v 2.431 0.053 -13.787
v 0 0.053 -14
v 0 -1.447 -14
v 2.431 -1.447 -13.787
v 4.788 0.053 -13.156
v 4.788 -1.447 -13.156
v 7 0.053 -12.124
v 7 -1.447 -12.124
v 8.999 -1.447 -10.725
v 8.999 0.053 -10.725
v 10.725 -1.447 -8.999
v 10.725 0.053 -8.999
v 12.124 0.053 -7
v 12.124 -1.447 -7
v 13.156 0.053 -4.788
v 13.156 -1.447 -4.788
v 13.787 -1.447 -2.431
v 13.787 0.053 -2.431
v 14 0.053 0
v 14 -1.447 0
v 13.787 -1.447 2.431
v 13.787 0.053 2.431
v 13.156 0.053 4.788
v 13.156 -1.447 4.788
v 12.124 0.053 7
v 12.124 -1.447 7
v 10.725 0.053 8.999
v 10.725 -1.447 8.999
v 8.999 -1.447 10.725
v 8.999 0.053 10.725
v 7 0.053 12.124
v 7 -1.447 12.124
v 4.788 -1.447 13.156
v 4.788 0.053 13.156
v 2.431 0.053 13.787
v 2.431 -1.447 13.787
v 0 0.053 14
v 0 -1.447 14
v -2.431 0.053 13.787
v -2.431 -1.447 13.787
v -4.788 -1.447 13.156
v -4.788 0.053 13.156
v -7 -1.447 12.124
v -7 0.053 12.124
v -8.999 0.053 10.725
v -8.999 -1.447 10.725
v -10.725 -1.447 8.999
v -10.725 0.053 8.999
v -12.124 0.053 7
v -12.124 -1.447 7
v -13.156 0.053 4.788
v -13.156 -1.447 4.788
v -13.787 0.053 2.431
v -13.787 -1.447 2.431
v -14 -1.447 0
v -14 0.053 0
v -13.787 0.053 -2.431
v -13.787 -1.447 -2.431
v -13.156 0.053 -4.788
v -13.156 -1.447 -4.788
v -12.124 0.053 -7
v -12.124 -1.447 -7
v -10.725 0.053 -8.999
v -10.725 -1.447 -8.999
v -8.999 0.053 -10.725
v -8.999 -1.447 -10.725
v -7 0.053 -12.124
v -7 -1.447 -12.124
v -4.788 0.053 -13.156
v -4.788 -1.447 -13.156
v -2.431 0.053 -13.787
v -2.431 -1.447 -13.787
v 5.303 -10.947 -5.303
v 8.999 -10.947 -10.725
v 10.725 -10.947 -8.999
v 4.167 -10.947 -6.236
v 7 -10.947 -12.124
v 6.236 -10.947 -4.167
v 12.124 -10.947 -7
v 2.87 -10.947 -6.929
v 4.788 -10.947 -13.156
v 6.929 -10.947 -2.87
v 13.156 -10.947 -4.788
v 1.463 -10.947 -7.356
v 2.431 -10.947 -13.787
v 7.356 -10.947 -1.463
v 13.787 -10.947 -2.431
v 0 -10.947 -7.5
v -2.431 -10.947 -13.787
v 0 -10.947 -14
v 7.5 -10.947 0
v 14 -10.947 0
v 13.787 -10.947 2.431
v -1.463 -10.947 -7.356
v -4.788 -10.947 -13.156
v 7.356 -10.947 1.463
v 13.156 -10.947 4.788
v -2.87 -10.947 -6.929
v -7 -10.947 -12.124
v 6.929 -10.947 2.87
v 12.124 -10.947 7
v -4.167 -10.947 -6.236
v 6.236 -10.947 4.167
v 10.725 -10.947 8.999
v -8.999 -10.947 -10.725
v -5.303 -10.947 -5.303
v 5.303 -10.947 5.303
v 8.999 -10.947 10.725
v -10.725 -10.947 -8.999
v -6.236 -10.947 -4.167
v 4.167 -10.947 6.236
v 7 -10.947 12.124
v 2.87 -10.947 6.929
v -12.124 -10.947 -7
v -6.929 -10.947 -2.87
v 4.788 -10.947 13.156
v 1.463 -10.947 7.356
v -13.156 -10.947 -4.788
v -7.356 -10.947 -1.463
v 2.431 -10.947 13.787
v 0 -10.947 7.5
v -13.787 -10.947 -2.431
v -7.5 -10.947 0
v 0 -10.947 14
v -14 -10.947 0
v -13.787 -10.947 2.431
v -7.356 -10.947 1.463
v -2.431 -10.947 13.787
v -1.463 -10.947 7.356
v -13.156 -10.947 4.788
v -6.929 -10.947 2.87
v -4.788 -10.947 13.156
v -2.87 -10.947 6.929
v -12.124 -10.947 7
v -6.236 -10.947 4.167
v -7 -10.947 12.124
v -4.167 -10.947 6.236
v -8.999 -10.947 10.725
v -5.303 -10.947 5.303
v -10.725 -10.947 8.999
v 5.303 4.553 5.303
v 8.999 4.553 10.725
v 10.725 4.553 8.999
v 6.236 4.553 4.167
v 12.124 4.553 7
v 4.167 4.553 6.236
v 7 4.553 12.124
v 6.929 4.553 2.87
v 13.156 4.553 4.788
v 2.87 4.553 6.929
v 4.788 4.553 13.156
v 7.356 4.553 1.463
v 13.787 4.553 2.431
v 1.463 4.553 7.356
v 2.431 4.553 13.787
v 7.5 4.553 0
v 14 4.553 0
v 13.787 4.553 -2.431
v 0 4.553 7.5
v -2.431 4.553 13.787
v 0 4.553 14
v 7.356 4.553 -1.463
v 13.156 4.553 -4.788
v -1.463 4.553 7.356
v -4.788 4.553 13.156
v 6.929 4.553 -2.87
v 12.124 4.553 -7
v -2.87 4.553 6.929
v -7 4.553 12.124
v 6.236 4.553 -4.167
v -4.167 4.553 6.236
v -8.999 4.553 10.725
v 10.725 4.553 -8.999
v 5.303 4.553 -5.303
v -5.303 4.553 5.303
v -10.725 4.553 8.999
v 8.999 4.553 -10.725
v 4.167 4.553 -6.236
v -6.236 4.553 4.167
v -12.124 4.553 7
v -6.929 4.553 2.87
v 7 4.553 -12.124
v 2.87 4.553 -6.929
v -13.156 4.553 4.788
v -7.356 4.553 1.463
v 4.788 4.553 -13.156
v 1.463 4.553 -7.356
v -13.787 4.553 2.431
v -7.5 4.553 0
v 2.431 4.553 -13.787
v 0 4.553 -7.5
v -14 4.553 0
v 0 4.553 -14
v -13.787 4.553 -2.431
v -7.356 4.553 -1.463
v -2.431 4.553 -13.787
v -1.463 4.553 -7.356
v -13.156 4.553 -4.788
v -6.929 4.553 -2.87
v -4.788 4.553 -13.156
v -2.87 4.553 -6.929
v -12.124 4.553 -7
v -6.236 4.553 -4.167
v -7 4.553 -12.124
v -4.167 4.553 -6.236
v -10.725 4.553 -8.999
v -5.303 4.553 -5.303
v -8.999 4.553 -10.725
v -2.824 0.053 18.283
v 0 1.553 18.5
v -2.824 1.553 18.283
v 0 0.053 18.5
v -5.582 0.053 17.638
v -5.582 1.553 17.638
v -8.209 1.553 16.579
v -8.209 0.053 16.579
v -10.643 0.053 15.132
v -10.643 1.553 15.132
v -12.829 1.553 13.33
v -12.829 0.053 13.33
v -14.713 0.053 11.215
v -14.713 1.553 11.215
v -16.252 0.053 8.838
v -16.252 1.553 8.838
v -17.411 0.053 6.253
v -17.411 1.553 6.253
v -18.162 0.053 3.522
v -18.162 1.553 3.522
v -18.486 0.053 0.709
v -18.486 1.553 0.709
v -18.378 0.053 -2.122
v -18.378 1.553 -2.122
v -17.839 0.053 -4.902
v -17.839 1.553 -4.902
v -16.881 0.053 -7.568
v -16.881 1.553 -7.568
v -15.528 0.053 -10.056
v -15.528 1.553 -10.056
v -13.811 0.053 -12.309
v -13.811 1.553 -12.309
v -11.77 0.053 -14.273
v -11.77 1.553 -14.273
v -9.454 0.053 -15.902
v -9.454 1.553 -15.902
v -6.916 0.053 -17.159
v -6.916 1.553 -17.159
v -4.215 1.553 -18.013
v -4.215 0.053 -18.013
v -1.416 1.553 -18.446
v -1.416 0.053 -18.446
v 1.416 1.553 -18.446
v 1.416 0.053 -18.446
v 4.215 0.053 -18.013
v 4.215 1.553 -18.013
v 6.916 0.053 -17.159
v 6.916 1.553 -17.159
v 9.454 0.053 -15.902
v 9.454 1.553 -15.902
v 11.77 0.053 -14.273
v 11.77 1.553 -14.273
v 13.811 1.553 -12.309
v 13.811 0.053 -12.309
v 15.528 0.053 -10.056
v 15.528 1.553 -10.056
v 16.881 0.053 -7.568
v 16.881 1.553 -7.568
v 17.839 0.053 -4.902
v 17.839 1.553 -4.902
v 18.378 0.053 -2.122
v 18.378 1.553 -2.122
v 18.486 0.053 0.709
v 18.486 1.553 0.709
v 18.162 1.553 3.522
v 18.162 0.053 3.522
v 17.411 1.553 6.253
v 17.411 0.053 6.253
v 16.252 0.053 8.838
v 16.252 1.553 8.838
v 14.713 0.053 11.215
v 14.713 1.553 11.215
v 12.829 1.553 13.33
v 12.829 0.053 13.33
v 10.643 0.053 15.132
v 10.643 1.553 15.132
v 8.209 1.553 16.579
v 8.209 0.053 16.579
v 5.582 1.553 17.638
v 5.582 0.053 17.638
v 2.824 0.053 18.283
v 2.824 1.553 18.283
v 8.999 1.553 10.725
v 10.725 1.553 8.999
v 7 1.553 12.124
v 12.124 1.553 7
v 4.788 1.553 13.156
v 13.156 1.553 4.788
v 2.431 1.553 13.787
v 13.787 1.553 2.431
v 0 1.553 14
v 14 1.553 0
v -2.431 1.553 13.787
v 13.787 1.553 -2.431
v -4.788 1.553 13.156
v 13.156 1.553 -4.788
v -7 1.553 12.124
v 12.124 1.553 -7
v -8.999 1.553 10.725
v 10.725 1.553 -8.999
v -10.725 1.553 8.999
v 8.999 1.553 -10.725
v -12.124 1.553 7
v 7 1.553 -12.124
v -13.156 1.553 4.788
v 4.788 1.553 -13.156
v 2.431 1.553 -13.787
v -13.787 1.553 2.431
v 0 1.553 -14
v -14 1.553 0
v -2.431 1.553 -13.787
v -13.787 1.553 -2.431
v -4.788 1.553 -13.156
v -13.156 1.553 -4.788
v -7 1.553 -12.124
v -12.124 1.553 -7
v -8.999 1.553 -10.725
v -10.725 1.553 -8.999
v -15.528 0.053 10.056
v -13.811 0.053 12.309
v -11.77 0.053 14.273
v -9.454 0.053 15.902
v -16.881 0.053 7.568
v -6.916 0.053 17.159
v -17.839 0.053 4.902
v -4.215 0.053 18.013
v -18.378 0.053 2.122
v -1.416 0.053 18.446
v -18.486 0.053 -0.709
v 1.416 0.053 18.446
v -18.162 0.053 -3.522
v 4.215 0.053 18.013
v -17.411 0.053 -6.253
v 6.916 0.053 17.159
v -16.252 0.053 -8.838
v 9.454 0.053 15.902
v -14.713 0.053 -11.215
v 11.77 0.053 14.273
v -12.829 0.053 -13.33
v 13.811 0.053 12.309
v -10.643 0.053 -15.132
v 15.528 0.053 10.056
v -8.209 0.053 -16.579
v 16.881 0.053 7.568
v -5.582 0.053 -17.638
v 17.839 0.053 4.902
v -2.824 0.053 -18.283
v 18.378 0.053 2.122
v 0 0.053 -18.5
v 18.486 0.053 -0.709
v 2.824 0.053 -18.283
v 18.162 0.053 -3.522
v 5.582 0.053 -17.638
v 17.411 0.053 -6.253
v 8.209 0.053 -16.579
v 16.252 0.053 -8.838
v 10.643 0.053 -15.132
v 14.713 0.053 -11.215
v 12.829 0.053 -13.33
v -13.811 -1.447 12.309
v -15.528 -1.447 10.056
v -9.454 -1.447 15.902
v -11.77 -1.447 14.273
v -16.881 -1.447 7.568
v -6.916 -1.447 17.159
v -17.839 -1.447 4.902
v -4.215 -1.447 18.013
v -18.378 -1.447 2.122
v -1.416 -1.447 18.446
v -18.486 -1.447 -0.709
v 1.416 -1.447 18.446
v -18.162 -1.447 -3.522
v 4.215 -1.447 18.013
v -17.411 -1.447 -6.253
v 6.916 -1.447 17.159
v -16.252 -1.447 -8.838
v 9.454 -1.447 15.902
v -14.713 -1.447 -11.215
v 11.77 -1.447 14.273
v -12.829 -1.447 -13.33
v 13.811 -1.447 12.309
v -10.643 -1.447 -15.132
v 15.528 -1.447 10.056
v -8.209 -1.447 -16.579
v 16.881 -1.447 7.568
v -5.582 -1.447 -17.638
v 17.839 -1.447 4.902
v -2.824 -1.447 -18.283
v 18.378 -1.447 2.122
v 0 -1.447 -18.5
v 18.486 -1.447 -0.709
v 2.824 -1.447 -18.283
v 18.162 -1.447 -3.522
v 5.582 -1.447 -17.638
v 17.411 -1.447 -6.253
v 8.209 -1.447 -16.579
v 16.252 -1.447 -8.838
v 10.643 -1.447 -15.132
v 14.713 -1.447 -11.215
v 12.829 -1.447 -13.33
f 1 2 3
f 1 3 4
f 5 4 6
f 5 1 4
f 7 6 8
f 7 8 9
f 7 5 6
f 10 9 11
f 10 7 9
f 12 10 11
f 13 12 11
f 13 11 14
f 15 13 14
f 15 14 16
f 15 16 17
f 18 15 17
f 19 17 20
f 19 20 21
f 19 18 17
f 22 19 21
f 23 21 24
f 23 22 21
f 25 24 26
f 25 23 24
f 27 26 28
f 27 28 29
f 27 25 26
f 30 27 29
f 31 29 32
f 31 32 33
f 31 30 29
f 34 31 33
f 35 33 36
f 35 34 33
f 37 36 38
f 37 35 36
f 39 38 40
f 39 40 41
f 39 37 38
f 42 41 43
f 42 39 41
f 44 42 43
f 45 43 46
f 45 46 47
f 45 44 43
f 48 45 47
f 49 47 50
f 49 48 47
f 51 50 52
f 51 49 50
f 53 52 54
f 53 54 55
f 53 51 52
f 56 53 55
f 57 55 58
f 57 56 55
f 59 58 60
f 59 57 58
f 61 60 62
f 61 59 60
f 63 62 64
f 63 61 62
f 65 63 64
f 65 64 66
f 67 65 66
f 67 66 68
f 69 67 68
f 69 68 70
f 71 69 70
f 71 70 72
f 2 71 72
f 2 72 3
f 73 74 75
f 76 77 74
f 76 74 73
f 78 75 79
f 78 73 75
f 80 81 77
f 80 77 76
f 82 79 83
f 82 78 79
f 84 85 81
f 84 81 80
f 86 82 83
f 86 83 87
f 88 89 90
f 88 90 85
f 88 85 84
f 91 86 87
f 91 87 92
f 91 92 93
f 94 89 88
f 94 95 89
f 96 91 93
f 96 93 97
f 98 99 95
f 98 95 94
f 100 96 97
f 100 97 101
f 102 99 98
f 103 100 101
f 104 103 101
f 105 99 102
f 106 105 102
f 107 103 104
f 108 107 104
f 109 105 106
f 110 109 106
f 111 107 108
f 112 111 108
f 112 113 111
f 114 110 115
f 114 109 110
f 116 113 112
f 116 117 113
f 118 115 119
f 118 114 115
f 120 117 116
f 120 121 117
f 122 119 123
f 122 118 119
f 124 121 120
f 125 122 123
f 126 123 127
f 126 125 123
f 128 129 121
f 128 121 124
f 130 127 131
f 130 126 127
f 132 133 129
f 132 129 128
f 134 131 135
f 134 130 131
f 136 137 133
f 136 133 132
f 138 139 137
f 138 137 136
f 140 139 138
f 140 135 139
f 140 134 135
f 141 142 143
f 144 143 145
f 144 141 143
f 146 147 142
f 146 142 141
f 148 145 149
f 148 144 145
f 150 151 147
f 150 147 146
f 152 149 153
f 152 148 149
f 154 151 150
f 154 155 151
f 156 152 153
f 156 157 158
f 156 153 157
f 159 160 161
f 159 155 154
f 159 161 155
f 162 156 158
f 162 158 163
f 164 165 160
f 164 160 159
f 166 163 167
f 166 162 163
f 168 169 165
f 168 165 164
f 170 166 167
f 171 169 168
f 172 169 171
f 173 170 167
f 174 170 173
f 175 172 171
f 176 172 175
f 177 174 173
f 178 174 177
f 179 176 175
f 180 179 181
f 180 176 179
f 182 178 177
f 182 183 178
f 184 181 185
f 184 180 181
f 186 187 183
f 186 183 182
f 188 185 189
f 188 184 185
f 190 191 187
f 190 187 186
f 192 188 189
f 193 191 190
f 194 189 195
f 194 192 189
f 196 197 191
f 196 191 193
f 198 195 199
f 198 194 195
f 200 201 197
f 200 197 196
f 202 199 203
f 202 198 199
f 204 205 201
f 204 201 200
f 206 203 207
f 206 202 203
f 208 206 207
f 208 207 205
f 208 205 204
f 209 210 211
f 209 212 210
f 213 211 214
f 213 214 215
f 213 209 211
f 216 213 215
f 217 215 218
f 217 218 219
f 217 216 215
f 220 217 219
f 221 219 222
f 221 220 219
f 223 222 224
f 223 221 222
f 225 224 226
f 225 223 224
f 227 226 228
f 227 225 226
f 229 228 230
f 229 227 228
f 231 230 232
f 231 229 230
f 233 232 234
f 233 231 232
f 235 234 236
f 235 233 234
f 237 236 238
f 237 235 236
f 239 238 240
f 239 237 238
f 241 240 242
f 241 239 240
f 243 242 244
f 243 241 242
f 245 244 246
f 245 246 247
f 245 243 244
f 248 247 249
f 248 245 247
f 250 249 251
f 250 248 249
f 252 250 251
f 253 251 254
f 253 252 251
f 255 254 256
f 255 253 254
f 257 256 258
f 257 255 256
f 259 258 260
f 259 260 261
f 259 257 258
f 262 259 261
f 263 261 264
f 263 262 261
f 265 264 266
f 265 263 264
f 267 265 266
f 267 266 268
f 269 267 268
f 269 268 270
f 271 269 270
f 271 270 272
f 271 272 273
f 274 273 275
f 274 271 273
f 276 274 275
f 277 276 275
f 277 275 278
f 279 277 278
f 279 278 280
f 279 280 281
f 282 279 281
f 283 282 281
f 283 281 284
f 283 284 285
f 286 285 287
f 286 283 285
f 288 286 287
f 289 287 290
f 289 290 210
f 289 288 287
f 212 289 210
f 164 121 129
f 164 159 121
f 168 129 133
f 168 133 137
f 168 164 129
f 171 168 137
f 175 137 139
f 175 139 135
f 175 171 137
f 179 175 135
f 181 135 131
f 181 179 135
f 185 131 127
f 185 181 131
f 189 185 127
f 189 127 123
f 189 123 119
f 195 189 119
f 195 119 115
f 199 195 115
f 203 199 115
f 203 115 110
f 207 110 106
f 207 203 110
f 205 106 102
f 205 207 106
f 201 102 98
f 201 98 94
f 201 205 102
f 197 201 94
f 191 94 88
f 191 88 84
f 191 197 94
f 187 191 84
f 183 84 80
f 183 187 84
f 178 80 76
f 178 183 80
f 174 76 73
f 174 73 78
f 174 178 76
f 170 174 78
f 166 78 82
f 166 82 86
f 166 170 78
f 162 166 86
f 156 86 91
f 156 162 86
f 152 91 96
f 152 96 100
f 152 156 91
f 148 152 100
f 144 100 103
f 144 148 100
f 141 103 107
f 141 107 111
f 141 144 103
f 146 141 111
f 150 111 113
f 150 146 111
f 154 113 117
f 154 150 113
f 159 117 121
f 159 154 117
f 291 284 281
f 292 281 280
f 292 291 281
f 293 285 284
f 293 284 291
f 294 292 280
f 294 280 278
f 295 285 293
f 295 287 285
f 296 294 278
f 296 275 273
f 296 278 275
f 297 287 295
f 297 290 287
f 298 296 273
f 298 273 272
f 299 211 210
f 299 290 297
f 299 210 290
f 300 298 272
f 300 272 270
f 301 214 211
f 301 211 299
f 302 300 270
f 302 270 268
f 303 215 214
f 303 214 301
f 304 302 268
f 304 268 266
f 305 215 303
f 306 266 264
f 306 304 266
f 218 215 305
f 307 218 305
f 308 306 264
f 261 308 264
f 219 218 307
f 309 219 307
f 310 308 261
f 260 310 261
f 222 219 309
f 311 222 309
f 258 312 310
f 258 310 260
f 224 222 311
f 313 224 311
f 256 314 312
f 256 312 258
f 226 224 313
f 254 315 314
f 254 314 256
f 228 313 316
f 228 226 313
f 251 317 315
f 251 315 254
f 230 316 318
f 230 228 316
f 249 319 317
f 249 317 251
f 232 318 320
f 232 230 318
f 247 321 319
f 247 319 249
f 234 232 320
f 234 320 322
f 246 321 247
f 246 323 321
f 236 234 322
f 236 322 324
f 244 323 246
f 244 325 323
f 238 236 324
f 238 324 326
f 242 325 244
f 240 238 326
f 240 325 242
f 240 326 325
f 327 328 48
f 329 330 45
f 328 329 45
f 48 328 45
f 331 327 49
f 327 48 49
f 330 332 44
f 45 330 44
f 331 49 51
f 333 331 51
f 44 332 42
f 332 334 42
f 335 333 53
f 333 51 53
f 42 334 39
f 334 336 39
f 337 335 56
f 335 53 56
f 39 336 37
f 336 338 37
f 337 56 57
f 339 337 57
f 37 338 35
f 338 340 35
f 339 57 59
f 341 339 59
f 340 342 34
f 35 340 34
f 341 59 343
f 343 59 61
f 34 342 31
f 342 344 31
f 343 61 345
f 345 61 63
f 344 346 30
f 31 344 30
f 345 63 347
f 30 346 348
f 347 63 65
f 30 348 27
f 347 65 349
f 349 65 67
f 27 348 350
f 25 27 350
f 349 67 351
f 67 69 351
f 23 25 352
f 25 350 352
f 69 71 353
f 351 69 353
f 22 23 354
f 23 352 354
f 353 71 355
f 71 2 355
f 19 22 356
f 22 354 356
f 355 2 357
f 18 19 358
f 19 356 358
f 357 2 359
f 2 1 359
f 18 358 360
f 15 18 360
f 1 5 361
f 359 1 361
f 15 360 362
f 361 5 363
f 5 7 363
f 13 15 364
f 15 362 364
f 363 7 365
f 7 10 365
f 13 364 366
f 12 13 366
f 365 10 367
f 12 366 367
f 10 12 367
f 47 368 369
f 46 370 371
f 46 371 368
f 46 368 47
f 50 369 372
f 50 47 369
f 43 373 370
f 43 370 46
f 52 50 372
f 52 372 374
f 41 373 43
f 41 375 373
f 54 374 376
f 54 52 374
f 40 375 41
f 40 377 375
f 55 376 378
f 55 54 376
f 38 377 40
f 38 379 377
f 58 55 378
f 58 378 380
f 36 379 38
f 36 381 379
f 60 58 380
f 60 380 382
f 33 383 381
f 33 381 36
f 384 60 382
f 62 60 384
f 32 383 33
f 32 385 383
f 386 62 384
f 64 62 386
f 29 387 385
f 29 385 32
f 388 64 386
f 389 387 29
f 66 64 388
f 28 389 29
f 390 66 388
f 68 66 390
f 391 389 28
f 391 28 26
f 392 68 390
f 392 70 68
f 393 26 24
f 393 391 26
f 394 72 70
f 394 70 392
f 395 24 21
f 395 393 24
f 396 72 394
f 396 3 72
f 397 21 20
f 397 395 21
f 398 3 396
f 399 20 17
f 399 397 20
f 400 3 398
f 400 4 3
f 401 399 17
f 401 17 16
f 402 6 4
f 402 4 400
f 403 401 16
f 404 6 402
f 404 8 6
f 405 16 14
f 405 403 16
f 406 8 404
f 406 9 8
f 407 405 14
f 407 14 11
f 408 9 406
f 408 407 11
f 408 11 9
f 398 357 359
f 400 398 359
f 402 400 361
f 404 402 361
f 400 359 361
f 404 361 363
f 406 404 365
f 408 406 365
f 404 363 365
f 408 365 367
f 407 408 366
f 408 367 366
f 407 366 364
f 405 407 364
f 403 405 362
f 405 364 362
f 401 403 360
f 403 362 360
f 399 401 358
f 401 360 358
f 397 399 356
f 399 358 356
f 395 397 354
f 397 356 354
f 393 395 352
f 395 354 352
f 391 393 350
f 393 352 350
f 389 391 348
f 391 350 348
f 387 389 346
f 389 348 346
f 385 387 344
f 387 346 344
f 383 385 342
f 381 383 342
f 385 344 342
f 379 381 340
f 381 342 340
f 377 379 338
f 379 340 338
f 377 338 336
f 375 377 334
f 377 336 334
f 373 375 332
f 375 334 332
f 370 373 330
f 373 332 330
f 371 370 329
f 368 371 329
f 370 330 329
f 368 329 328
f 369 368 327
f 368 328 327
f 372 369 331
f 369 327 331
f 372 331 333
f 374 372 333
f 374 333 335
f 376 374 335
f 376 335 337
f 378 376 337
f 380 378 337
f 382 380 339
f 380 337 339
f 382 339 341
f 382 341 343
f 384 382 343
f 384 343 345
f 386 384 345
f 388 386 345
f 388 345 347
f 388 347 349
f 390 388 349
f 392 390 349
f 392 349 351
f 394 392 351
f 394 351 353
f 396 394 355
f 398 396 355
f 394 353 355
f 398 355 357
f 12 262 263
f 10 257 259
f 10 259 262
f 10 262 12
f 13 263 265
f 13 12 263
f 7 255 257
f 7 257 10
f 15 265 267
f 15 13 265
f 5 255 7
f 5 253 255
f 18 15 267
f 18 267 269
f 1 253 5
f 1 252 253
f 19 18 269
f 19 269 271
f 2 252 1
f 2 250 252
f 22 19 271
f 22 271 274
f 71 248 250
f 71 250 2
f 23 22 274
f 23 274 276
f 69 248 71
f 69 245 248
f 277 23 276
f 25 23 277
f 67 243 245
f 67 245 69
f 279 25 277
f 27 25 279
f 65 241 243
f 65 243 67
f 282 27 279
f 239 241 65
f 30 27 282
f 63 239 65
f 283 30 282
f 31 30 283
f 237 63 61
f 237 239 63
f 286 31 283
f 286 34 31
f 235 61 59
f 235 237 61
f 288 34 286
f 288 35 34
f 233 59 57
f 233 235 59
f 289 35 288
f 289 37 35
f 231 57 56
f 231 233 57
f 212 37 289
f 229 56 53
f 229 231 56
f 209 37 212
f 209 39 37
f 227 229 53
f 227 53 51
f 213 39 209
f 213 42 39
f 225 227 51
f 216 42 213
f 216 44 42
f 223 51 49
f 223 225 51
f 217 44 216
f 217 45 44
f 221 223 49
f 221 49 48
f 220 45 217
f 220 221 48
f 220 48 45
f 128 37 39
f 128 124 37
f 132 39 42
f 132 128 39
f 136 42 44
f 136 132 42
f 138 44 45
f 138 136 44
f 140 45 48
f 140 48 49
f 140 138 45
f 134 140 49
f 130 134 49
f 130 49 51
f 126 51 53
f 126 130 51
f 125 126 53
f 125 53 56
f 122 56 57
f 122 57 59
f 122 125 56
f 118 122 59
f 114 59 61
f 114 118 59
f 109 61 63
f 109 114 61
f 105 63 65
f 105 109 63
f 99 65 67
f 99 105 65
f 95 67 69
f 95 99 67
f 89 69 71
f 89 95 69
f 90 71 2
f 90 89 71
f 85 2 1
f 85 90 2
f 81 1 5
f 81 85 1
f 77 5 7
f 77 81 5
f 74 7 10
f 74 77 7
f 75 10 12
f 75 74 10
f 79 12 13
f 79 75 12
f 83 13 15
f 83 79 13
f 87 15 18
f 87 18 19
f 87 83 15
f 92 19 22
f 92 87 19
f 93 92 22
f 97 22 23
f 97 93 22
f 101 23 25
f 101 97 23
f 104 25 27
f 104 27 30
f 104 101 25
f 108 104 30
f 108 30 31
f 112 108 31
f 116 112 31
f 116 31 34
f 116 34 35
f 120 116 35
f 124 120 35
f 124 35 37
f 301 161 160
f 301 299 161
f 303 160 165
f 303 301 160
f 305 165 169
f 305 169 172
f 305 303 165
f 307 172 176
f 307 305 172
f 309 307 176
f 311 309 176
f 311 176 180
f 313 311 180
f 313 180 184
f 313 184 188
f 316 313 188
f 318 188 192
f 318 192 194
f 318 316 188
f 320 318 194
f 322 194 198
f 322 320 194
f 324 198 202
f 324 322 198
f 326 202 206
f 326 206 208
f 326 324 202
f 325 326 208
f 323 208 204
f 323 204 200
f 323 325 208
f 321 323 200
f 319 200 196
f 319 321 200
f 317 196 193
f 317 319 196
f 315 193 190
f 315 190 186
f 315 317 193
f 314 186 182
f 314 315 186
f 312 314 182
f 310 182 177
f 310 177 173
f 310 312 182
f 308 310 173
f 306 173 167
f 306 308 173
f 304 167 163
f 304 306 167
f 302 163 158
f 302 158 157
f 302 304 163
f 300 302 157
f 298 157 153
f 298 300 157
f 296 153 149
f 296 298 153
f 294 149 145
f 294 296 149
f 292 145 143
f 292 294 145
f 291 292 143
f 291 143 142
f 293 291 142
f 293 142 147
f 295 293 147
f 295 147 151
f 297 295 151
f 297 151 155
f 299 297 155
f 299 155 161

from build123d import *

# Parameters (mm, degrees)
SKETCH2_R           = 18.5
SKETCH2_R_2         = 14
BOSS_EXTRUDE1_DEPTH = 1.5


with BuildPart() as part:
    # Sketch1 → Revolve1 (revolve)
    with BuildSketch(Plane.XY, mode=Mode.PRIVATE) as revolve1_sk:
        Polygon((-7.5, 4.552980132), (-14, 4.552980132), (-14, 1.552980132), (-18.5, 1.552980132), (-18.5, 0.052980132), (-14, 0.052980132), (-14, -10.947019868), (-7.5, -10.947019868), align=None)
    revolve(revolve1_sk.sketch.rotate(Axis((0, 7.466887417, 0), (0, -1, 0)), 270), axis=Axis((0, 7.466887417, 0), (0, -1, 0)))


with BuildPart() as body_2:
    # Sketch2 → Boss-Extrude1 (new body)
    with BuildSketch(Plane.XZ.offset(-0.052980132)):
        with Locations(Location((0, 0, 0), (0, 0, 270))):
            Circle(SKETCH2_R)
        with Locations(Location((0, 0, 0), (0, 0, 270))):
            Circle(SKETCH2_R_2, mode=Mode.SUBTRACT)
    extrude(amount=BOSS_EXTRUDE1_DEPTH)


solid = Compound([part.part, body_2.part])
